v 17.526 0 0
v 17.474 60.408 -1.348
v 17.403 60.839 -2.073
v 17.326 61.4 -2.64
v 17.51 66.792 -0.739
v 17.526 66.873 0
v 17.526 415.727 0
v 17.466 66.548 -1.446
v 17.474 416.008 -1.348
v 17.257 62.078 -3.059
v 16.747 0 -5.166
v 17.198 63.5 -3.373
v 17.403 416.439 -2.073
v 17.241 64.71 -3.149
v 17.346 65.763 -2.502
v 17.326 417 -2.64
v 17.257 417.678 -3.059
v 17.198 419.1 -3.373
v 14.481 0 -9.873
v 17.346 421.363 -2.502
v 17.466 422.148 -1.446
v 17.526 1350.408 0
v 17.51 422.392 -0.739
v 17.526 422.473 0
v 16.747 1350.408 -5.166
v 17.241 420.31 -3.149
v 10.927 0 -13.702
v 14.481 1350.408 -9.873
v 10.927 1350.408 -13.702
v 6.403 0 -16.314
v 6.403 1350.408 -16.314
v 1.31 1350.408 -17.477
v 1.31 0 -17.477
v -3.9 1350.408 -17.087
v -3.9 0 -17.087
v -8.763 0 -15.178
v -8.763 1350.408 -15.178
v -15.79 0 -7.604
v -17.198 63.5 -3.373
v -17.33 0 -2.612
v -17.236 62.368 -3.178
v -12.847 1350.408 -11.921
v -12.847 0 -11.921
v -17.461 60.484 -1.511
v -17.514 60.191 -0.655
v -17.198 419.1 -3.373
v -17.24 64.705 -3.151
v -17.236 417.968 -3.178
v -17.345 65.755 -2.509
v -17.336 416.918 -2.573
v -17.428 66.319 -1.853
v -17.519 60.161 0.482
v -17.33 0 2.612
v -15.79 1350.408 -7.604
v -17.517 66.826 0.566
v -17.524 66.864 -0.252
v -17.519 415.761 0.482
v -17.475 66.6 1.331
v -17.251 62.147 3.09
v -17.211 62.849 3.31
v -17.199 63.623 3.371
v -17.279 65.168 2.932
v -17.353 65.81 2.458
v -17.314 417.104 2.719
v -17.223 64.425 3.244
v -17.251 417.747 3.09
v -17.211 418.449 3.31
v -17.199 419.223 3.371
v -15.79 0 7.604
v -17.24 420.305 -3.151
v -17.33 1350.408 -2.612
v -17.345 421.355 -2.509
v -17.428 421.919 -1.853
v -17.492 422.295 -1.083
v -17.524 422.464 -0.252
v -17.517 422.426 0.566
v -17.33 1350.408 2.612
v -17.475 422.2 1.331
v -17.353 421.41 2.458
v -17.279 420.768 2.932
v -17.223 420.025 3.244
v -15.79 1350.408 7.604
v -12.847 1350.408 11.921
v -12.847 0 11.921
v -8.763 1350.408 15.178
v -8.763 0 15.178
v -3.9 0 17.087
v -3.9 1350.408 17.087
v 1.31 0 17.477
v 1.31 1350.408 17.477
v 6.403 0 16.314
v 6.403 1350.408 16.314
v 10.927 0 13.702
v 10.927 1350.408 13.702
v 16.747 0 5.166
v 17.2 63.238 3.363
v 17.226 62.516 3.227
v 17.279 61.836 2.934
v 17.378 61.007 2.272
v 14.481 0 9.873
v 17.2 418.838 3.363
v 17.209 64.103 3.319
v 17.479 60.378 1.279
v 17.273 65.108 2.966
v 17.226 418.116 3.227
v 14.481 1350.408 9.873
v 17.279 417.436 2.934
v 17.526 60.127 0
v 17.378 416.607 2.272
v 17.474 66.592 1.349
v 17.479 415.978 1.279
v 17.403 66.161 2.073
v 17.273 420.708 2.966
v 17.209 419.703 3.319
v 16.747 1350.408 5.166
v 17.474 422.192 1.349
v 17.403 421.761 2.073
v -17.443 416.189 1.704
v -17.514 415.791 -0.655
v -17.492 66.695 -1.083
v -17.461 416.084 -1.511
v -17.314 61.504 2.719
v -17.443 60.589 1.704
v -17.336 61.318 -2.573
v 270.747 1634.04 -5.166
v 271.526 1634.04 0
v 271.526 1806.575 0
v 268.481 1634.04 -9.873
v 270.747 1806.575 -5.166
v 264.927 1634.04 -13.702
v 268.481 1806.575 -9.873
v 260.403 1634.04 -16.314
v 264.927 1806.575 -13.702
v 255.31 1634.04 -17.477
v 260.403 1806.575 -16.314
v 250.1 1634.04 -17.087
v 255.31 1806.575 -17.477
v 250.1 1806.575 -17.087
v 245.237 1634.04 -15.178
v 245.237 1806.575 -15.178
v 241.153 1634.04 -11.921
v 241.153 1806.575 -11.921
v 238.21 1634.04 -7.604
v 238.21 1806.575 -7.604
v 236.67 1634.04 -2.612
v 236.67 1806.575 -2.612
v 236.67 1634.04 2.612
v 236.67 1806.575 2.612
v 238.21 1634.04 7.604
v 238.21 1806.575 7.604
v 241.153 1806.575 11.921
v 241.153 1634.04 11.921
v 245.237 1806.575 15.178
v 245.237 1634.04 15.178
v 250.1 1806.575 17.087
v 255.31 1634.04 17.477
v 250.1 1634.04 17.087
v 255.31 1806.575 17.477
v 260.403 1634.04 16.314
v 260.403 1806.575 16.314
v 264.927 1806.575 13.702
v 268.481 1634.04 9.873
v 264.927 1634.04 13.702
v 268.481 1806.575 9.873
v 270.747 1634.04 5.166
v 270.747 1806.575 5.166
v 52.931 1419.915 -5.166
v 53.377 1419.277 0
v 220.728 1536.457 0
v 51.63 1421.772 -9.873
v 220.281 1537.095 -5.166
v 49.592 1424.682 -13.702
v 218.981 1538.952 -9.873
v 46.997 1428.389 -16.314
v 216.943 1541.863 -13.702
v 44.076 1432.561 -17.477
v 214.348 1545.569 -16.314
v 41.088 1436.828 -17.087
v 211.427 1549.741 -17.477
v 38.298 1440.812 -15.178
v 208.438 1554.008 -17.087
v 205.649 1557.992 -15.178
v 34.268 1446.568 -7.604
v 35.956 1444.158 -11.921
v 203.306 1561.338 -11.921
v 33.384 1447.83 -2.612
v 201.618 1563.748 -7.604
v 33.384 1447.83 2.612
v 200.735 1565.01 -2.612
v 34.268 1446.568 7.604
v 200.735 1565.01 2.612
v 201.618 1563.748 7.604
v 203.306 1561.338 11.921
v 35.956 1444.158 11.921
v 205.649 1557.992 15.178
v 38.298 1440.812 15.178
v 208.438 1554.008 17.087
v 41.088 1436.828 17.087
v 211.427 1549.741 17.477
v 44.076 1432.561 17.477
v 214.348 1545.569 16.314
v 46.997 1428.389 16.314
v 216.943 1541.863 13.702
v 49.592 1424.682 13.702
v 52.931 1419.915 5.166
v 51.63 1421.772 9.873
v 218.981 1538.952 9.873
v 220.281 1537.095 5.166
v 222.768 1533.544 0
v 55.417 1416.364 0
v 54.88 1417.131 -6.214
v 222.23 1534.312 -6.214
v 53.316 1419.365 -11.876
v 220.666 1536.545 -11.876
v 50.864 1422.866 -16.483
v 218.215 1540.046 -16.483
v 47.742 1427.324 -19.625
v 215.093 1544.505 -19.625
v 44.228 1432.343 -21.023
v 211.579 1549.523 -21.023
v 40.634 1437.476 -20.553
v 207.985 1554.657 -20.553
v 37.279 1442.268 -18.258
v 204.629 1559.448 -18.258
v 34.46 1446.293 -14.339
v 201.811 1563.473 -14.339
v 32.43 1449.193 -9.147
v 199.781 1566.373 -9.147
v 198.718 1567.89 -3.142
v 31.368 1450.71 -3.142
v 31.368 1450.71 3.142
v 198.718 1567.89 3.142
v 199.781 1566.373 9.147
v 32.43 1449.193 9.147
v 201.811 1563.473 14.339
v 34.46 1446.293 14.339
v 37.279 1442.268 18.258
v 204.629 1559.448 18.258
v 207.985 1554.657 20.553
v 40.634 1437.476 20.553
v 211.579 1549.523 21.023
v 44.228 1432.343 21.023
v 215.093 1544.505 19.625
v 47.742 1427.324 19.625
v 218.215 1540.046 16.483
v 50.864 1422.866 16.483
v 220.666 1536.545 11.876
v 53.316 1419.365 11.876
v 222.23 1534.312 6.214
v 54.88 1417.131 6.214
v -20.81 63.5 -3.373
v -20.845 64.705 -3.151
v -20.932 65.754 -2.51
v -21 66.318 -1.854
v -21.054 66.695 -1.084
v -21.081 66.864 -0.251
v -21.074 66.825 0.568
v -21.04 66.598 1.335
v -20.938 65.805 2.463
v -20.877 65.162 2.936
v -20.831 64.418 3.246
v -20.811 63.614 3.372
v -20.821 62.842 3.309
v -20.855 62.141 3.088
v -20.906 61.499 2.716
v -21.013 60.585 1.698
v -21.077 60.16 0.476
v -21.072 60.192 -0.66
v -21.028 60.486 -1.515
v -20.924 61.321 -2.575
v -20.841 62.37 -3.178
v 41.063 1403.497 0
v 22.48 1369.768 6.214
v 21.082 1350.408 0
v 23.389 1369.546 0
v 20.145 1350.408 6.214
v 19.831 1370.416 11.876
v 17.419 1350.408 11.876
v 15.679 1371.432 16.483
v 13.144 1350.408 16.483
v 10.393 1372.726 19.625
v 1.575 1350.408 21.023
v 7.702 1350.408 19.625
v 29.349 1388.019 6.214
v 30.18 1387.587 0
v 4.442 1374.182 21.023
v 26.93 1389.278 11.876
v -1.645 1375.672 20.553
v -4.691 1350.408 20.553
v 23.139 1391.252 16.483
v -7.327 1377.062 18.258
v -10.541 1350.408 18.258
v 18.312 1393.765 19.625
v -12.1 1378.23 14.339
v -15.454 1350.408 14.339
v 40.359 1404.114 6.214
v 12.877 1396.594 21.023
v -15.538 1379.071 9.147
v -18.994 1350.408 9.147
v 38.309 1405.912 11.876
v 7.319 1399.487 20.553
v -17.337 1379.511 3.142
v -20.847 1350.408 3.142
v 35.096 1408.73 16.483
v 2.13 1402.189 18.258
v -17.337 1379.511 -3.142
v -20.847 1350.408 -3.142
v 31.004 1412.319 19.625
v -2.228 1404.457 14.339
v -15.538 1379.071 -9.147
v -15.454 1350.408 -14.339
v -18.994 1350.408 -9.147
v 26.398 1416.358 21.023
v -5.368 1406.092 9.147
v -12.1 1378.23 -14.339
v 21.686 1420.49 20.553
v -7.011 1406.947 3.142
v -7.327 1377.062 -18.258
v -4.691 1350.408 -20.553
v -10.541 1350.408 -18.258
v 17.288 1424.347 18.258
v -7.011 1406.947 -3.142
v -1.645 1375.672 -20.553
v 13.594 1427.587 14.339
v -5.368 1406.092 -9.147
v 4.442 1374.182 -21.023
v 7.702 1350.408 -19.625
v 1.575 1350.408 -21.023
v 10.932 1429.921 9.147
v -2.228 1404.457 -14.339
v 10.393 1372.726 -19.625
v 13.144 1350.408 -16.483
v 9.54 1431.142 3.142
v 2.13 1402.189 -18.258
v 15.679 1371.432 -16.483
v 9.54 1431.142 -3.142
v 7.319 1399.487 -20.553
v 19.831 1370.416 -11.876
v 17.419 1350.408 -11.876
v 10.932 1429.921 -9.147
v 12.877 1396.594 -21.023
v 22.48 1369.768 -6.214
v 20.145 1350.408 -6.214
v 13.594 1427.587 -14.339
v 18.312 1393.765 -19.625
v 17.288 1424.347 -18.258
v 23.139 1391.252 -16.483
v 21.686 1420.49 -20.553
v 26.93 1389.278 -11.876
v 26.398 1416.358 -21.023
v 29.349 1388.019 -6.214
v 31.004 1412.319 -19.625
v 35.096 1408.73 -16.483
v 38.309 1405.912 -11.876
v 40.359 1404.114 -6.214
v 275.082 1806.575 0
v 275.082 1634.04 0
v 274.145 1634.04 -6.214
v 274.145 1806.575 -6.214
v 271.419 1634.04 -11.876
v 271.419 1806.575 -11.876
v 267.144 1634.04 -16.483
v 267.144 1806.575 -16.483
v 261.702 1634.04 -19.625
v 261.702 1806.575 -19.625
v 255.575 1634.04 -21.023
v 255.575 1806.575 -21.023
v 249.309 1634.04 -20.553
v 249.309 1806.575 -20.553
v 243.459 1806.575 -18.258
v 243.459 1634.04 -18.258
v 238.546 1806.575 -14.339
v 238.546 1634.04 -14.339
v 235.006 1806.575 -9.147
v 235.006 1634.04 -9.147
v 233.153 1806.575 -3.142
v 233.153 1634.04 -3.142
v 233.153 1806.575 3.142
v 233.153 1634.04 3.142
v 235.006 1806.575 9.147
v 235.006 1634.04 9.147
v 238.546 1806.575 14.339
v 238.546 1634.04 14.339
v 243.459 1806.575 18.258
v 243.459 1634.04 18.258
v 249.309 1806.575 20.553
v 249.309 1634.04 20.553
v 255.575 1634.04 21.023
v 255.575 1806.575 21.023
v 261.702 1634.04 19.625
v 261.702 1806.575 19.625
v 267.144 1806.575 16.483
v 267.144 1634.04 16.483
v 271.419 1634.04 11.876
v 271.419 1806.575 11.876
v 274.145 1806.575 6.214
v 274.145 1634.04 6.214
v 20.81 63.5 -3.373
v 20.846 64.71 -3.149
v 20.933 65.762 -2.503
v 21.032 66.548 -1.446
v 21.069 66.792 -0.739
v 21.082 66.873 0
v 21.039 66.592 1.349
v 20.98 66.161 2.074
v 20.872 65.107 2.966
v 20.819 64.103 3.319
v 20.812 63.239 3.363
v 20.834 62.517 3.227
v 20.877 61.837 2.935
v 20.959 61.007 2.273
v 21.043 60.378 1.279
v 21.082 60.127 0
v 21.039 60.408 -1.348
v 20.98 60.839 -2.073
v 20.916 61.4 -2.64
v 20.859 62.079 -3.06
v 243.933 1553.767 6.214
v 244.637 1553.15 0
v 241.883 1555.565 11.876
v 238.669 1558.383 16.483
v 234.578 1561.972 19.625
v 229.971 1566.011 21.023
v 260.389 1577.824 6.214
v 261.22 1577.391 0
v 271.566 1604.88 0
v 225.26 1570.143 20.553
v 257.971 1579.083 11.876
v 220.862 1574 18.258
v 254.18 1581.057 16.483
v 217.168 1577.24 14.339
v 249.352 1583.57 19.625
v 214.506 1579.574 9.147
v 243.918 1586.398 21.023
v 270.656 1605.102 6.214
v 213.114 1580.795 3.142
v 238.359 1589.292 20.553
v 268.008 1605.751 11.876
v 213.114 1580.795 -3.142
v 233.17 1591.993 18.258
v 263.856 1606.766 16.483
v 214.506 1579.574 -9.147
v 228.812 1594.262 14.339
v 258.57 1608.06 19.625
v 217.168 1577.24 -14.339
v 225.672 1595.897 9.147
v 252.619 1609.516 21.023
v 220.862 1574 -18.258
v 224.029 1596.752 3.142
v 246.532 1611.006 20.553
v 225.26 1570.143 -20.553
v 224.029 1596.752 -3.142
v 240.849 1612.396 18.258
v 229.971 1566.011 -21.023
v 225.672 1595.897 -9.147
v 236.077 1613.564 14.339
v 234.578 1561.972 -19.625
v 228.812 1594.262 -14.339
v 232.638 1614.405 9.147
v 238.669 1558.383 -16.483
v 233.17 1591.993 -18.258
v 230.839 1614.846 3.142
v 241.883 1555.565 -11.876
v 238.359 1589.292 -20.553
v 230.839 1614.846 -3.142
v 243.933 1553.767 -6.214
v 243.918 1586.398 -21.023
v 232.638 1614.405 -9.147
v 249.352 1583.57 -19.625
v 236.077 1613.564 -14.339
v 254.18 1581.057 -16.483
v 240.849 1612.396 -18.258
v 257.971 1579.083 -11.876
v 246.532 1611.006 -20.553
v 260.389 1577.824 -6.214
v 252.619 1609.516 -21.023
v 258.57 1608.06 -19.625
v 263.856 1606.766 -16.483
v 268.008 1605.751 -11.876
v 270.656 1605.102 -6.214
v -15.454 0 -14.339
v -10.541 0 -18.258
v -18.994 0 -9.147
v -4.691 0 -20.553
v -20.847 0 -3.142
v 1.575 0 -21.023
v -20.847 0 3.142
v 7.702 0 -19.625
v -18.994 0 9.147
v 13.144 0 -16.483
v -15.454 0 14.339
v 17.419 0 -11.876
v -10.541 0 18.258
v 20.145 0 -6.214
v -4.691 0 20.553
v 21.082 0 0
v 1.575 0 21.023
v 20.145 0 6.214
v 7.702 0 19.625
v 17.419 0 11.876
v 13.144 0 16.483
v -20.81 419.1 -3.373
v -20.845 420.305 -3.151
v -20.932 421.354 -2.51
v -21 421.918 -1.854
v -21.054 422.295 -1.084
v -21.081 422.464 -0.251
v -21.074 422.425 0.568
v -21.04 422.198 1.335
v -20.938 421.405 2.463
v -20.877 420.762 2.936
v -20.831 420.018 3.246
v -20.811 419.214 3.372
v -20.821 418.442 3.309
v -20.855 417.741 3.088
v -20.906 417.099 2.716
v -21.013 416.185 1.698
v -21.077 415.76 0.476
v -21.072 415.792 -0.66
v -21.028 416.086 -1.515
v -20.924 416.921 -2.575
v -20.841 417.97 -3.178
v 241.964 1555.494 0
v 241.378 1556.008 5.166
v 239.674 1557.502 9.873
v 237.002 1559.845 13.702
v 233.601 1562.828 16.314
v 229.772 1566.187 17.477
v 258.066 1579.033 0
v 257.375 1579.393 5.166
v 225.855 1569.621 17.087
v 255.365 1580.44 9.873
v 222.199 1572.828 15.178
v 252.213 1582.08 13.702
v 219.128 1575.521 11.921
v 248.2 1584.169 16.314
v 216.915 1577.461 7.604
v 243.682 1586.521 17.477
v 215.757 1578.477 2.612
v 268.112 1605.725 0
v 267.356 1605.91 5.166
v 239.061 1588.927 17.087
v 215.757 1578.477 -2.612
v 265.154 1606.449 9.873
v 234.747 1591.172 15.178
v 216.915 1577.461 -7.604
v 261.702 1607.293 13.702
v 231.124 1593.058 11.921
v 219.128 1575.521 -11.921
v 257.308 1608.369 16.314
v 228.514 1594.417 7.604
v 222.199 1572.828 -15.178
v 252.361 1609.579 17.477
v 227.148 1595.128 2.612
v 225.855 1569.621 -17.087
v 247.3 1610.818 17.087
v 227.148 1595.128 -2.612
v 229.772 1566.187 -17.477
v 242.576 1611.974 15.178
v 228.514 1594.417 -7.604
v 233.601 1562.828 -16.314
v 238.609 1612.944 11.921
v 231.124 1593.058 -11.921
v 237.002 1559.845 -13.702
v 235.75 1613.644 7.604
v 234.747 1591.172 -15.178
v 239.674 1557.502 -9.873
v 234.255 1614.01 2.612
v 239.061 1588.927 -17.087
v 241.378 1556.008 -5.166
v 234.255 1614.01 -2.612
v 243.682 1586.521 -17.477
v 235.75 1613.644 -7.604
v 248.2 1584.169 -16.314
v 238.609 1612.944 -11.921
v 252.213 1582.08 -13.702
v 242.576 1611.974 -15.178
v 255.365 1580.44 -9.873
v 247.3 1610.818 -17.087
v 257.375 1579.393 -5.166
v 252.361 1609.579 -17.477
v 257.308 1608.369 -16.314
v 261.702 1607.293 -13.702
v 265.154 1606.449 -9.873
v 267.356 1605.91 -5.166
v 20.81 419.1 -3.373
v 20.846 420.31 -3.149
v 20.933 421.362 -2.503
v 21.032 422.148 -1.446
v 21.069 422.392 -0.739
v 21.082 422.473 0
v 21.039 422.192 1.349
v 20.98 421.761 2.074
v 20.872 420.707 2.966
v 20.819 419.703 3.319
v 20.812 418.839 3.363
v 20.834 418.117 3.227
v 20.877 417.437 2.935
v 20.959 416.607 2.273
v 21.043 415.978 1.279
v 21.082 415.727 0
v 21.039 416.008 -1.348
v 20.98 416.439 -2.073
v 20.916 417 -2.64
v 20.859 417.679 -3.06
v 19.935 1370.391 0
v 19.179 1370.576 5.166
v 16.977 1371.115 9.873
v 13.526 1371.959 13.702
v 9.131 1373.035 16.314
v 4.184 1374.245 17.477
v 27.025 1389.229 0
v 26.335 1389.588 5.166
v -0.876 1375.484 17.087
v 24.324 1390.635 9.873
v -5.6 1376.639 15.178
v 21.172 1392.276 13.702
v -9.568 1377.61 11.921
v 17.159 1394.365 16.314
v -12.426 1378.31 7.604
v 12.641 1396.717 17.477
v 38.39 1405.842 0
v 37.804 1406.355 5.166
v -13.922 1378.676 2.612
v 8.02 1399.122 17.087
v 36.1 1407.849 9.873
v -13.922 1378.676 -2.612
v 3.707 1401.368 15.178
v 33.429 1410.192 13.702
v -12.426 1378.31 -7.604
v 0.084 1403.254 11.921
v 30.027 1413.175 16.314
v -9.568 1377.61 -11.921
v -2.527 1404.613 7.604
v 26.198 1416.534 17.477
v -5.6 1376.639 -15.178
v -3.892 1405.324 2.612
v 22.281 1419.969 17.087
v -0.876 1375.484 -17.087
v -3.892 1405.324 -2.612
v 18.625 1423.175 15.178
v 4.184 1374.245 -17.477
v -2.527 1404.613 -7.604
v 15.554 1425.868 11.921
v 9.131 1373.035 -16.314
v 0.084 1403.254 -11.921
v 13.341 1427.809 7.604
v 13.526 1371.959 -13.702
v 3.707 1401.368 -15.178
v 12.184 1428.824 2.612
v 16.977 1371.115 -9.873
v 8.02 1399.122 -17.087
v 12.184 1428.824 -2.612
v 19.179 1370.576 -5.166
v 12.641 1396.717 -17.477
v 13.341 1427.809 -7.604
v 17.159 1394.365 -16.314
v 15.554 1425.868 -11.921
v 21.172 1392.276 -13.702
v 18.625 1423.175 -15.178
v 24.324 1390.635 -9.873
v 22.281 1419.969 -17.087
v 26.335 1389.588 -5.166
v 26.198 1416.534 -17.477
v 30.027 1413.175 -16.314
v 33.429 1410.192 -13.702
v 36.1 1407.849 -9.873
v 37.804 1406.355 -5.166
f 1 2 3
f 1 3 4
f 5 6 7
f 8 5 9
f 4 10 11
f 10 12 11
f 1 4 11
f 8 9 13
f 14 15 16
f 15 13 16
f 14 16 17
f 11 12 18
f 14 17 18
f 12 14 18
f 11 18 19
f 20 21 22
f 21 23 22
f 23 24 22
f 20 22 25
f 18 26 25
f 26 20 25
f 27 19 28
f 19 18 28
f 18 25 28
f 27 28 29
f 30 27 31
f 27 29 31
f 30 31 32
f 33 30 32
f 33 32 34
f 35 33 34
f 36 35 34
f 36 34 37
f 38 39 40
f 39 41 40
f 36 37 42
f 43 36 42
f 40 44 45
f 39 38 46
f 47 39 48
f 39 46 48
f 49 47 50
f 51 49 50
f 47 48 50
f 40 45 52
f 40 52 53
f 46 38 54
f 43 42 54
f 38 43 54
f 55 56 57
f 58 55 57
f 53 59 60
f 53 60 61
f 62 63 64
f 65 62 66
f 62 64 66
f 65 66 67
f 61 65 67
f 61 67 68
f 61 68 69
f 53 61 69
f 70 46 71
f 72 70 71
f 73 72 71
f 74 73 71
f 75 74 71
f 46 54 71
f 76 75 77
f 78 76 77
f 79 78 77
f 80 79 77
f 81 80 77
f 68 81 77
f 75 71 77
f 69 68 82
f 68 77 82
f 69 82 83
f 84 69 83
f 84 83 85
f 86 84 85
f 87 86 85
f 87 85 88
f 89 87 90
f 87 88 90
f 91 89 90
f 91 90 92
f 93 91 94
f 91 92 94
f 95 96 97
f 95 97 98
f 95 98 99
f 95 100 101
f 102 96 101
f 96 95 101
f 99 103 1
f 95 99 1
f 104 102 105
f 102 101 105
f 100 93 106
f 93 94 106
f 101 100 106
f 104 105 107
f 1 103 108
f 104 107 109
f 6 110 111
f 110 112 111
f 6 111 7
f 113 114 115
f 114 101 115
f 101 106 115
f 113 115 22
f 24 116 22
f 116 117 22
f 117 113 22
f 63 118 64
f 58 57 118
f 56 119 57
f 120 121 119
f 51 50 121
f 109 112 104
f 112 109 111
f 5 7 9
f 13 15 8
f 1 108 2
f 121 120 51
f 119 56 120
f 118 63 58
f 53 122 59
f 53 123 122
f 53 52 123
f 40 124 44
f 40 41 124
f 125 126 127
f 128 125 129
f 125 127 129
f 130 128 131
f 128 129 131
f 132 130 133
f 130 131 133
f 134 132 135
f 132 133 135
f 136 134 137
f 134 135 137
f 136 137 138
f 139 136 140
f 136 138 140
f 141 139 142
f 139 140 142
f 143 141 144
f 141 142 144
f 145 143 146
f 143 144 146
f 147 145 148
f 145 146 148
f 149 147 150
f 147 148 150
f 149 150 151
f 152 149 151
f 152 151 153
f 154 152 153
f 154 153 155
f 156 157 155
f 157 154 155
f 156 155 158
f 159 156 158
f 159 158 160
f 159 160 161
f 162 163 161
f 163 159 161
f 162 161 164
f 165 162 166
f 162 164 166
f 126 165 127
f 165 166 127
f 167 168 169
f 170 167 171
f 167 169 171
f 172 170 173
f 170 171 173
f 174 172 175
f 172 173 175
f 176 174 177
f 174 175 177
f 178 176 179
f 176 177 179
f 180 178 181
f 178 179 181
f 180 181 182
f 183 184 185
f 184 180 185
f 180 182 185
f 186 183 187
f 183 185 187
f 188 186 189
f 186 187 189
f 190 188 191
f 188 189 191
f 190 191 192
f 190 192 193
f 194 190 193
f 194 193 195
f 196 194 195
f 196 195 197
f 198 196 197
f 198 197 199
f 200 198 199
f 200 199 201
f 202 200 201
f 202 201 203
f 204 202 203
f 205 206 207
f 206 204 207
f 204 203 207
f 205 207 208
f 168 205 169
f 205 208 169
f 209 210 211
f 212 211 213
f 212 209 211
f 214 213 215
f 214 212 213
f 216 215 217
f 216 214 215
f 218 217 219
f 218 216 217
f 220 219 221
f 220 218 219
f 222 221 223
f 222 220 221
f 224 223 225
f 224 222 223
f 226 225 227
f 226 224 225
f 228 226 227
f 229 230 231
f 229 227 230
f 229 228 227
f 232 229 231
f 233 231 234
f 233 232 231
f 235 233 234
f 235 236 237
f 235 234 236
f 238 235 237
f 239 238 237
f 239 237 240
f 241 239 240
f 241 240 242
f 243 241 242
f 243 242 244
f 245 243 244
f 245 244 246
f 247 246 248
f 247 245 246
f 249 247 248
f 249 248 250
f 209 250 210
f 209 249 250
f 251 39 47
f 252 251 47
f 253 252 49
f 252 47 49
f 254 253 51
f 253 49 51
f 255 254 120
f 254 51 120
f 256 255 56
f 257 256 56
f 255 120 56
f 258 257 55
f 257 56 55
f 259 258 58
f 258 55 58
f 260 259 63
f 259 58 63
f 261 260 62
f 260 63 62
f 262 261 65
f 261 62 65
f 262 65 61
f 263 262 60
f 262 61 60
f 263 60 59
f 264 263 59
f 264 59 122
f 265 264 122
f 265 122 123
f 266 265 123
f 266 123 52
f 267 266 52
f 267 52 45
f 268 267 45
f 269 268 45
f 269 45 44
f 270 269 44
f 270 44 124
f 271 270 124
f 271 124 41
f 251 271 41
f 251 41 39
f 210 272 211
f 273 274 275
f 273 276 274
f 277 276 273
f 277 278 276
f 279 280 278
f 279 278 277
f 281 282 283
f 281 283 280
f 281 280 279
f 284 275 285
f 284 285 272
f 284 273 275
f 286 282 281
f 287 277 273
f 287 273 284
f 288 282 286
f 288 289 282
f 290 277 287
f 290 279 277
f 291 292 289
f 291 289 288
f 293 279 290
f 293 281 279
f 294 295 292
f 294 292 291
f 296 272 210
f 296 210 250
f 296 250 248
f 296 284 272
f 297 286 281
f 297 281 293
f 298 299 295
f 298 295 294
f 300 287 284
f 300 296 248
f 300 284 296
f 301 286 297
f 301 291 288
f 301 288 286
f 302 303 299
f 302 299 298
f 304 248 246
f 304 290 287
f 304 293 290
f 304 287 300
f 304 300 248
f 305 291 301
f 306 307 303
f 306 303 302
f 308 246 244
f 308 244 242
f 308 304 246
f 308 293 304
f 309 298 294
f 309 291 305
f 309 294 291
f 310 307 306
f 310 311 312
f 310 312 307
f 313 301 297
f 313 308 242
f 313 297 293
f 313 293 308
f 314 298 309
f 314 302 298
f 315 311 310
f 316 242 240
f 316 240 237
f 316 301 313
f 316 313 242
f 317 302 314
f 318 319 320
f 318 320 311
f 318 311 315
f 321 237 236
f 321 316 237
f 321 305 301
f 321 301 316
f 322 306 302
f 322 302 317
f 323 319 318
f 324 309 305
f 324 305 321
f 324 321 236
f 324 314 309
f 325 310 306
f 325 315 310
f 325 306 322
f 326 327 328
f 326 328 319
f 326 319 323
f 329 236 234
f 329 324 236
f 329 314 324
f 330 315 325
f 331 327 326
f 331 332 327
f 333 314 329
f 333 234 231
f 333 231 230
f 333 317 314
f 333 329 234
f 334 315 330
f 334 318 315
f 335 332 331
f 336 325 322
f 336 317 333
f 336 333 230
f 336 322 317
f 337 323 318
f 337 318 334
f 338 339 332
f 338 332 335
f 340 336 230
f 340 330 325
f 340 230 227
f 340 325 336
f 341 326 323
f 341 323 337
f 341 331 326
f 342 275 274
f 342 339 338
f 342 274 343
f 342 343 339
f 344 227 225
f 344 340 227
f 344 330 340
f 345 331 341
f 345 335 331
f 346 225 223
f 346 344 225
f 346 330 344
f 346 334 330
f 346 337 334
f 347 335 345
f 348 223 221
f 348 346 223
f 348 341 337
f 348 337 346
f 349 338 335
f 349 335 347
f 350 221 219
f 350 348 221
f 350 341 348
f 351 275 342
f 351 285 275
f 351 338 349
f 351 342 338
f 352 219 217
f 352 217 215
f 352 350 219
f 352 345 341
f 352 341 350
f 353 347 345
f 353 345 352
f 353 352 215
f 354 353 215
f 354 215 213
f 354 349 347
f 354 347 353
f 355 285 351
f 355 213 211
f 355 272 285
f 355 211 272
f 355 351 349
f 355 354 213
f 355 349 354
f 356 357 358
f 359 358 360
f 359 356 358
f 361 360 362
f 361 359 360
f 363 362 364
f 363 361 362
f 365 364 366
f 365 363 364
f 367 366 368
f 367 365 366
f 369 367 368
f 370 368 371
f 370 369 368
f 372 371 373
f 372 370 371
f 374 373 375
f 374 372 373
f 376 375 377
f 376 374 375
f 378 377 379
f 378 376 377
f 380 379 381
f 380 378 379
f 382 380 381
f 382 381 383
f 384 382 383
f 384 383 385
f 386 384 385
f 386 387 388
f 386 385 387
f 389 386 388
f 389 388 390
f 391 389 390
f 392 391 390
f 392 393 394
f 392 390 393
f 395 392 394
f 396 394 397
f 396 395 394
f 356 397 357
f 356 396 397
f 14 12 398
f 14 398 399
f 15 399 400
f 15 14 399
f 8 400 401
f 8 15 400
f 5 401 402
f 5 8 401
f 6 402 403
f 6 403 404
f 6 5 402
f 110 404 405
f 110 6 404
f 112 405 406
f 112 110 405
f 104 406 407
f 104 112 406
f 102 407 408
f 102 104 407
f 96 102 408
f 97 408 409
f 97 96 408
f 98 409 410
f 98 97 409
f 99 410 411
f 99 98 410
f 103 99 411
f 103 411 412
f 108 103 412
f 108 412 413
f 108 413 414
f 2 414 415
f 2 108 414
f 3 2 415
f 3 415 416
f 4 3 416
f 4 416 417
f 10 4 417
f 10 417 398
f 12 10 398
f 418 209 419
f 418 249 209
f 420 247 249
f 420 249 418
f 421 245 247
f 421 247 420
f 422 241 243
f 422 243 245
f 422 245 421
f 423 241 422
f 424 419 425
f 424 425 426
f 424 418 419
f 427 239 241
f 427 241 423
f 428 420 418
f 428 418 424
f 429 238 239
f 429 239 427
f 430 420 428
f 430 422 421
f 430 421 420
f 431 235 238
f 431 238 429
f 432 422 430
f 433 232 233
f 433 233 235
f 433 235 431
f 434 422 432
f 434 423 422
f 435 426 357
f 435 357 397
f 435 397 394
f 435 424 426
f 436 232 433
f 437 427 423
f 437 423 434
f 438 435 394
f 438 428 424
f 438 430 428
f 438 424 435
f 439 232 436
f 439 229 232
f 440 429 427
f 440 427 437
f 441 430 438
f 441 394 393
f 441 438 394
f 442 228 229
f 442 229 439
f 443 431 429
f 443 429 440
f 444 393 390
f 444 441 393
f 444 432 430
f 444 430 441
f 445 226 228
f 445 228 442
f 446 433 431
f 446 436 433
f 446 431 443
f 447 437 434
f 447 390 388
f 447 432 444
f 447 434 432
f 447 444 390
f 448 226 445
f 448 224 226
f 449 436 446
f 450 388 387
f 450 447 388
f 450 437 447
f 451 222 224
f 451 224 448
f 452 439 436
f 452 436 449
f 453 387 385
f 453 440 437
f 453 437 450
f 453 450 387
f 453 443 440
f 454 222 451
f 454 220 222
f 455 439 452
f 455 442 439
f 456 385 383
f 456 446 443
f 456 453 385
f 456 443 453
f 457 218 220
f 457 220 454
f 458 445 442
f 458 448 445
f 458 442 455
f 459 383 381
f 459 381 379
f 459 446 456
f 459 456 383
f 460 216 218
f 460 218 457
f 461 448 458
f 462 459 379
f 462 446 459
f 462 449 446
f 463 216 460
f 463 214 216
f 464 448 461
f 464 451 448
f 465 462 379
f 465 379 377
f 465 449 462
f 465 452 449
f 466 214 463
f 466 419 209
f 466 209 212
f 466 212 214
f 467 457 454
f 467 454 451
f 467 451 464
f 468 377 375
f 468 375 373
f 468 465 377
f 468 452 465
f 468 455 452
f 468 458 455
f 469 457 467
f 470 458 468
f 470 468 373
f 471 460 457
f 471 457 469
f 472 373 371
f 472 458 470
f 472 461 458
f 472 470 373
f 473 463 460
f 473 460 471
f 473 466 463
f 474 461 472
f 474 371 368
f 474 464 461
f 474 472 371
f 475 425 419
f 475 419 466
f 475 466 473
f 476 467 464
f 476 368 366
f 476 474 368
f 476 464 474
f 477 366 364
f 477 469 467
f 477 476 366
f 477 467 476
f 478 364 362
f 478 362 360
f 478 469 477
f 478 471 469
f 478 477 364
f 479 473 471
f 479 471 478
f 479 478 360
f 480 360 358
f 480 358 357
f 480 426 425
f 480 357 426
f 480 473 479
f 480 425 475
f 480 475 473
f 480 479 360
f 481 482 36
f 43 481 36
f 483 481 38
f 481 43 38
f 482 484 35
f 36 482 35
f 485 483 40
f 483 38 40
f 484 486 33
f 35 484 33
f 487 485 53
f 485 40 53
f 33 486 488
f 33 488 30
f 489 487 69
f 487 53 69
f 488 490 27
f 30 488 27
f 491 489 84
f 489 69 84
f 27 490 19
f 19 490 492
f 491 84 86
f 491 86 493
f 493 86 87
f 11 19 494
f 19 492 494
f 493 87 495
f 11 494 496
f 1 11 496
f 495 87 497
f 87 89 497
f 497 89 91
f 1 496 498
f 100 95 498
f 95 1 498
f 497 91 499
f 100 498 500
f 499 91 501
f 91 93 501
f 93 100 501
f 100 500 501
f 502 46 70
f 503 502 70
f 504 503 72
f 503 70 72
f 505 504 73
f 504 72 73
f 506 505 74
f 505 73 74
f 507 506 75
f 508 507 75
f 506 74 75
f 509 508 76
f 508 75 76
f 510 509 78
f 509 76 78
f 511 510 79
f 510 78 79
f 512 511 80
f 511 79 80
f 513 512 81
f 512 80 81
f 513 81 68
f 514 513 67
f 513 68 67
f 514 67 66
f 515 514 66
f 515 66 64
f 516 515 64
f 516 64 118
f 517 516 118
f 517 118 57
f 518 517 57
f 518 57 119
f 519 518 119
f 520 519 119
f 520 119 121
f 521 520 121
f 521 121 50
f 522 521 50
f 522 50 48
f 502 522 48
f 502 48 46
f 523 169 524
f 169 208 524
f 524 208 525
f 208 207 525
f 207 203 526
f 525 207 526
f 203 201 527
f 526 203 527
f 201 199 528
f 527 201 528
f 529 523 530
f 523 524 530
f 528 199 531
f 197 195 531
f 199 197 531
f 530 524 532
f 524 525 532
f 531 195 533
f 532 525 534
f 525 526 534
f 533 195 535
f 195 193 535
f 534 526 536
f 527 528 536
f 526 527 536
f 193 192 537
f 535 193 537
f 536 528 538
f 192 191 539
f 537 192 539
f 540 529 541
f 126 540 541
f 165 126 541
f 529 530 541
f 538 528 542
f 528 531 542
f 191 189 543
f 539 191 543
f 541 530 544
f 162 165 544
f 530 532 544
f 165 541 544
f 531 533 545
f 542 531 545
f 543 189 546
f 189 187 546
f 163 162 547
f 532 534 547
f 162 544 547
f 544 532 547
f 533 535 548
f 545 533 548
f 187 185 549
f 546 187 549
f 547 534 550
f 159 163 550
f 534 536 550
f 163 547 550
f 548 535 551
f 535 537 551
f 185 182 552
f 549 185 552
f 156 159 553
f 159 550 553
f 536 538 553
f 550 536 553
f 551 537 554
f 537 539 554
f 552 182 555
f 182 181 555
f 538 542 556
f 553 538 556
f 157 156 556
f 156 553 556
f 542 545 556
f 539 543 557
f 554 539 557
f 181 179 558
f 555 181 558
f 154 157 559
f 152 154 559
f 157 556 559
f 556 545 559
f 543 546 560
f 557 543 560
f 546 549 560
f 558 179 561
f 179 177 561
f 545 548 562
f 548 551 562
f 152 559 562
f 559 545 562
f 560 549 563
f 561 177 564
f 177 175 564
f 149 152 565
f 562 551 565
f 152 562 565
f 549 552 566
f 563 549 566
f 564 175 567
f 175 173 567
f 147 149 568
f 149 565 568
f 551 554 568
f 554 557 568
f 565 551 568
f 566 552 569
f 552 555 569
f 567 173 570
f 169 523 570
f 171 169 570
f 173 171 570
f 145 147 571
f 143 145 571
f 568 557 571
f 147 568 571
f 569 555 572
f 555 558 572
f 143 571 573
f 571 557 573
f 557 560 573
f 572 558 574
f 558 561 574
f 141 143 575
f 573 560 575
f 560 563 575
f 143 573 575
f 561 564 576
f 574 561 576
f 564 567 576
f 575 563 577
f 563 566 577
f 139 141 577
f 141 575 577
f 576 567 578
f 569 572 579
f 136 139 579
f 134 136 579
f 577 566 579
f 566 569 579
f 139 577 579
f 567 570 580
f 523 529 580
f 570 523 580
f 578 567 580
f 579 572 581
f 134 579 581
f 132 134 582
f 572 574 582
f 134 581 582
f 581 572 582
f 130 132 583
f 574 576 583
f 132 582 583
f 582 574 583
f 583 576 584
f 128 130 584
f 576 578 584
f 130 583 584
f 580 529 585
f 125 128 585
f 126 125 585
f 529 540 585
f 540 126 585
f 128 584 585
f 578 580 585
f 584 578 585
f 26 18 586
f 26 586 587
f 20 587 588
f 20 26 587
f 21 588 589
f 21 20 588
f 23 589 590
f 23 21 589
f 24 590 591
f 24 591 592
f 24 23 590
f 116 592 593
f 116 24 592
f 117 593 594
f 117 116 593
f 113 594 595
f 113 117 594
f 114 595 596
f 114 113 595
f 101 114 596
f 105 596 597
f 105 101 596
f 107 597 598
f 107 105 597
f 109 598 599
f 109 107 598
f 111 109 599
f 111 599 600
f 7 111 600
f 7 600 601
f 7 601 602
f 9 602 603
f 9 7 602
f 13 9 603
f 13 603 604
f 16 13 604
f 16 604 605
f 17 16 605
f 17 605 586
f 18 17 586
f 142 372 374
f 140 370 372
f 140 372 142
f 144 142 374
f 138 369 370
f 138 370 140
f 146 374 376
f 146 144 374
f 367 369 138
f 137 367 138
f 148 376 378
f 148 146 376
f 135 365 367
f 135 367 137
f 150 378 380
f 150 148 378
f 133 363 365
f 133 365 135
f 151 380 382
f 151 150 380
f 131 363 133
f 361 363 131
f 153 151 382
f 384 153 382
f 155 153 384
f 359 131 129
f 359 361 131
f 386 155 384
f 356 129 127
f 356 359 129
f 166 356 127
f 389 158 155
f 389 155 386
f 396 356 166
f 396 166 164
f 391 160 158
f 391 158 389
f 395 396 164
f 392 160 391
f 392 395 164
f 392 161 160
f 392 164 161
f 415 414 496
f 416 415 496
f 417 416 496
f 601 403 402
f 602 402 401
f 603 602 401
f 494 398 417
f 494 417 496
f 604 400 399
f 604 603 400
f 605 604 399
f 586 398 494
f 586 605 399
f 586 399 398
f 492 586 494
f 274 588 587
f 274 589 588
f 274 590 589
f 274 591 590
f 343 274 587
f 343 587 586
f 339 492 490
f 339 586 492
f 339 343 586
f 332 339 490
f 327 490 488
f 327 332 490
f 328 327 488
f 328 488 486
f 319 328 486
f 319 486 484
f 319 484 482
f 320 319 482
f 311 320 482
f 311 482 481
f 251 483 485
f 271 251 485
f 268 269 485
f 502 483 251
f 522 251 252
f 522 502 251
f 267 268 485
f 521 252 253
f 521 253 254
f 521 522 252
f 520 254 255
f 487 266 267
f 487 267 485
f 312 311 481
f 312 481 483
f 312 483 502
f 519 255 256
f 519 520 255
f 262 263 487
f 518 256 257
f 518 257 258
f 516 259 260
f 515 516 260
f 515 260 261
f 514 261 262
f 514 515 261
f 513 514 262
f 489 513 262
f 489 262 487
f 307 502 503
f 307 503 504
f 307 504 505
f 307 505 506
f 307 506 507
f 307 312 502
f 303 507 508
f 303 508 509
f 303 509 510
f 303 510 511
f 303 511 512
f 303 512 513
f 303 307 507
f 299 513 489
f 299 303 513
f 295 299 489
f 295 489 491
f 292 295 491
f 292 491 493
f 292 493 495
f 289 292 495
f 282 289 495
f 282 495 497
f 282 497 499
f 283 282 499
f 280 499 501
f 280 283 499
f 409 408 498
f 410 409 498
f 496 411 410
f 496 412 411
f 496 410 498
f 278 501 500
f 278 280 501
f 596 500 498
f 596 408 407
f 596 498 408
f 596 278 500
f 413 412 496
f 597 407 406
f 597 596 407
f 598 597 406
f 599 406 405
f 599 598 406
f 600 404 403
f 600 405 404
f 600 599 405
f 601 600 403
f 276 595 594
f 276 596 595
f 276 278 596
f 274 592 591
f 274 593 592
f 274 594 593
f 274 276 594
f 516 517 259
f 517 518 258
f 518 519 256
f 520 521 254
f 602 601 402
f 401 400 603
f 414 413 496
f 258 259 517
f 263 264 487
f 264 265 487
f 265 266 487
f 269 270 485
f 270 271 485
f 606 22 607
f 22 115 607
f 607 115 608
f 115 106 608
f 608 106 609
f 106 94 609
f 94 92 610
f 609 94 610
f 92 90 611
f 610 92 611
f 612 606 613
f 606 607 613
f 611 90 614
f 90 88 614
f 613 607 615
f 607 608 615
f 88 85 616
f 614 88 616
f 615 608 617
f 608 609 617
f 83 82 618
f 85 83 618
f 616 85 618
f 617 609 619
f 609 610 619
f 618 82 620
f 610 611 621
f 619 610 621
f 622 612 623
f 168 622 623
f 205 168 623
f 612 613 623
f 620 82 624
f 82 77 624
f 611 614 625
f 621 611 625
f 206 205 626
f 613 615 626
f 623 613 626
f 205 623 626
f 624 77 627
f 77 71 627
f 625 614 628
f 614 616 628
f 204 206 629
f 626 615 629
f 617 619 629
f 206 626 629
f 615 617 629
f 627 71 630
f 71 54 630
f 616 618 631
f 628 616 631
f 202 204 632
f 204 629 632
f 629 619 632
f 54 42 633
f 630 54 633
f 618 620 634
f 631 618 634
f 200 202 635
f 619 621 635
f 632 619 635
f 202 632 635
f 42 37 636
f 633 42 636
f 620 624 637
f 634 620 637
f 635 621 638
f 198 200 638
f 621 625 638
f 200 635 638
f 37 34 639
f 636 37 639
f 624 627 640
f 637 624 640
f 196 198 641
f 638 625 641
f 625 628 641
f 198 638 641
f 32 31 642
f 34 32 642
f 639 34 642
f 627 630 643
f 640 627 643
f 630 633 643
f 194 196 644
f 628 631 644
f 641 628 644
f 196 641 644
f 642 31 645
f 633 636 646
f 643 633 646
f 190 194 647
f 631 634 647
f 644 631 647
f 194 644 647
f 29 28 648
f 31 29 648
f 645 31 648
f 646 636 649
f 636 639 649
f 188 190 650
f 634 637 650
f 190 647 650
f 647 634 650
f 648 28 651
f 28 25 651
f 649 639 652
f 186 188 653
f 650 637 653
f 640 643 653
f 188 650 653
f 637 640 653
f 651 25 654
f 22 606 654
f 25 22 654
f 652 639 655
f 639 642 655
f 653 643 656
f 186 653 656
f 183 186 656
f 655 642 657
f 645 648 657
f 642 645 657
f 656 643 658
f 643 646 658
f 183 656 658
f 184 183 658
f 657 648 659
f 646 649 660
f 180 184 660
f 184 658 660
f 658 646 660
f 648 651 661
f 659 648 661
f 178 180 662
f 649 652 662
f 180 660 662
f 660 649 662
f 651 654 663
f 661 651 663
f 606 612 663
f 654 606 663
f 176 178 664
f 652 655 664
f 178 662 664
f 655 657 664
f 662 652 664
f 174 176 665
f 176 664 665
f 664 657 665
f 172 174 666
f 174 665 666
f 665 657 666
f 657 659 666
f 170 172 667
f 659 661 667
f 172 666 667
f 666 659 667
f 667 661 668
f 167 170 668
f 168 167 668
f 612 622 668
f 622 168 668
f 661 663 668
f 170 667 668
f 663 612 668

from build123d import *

# Parameters (mm, degrees)
SKETCH3_R               = 21.082
SKETCH3_R_2             = 17.526
SKETCH5_R               = 3.3734375
CUT_EXTRUDE1_DEPTH      = 276.0820001
CUT_EXTRUDE1_DEPTH_BACK = 22.0820001


with BuildPart() as part:
    # Sweep1: sweep along a path in Sketch2
    with BuildLine(Plane.XY) as sweep1_path:
        Line((0, 0), (0, 1350.407672959))
        ThreePointArc((0, 1350.407672959), (11.479699349, 1397.321332063), (43.324634067, 1433.633520658))
        Line((43.324634067, 1433.633520658), (210.675365933, 1550.813764636))
        ThreePointArc((210.675365933, 1550.813764636), (242.520300651, 1587.125953231), (254, 1634.039612336))
        Line((254, 1634.039612336), (254, 1806.575))
    # Sketch3 → Sweep1 (sweep)
    with BuildSketch(Plane(origin=(0, 1806.575, 0), x_dir=(1, 0, 0), z_dir=(0, 1, 0))):
        with Locations((254, 0)):
            Circle(SKETCH3_R)
        with Locations((254, 0)):
            Circle(SKETCH3_R_2, mode=Mode.SUBTRACT)
    sweep(path=sweep1_path.line)

    # Sketch5 → Cut-Extrude1 (cut, two sides)
    with BuildSketch(Plane(origin=(0, 0, 0), x_dir=(0, 0, -1), z_dir=(1, 0, 0))) as cut_extrude1_sk:
        with Locations((0, 63.5)):
            Circle(SKETCH5_R)
        with Locations((0, 419.1)):
            Circle(SKETCH5_R)
    extrude(amount=CUT_EXTRUDE1_DEPTH, mode=Mode.SUBTRACT)
    extrude(cut_extrude1_sk.sketch, amount=-CUT_EXTRUDE1_DEPTH_BACK, mode=Mode.SUBTRACT)


solid = part.part
